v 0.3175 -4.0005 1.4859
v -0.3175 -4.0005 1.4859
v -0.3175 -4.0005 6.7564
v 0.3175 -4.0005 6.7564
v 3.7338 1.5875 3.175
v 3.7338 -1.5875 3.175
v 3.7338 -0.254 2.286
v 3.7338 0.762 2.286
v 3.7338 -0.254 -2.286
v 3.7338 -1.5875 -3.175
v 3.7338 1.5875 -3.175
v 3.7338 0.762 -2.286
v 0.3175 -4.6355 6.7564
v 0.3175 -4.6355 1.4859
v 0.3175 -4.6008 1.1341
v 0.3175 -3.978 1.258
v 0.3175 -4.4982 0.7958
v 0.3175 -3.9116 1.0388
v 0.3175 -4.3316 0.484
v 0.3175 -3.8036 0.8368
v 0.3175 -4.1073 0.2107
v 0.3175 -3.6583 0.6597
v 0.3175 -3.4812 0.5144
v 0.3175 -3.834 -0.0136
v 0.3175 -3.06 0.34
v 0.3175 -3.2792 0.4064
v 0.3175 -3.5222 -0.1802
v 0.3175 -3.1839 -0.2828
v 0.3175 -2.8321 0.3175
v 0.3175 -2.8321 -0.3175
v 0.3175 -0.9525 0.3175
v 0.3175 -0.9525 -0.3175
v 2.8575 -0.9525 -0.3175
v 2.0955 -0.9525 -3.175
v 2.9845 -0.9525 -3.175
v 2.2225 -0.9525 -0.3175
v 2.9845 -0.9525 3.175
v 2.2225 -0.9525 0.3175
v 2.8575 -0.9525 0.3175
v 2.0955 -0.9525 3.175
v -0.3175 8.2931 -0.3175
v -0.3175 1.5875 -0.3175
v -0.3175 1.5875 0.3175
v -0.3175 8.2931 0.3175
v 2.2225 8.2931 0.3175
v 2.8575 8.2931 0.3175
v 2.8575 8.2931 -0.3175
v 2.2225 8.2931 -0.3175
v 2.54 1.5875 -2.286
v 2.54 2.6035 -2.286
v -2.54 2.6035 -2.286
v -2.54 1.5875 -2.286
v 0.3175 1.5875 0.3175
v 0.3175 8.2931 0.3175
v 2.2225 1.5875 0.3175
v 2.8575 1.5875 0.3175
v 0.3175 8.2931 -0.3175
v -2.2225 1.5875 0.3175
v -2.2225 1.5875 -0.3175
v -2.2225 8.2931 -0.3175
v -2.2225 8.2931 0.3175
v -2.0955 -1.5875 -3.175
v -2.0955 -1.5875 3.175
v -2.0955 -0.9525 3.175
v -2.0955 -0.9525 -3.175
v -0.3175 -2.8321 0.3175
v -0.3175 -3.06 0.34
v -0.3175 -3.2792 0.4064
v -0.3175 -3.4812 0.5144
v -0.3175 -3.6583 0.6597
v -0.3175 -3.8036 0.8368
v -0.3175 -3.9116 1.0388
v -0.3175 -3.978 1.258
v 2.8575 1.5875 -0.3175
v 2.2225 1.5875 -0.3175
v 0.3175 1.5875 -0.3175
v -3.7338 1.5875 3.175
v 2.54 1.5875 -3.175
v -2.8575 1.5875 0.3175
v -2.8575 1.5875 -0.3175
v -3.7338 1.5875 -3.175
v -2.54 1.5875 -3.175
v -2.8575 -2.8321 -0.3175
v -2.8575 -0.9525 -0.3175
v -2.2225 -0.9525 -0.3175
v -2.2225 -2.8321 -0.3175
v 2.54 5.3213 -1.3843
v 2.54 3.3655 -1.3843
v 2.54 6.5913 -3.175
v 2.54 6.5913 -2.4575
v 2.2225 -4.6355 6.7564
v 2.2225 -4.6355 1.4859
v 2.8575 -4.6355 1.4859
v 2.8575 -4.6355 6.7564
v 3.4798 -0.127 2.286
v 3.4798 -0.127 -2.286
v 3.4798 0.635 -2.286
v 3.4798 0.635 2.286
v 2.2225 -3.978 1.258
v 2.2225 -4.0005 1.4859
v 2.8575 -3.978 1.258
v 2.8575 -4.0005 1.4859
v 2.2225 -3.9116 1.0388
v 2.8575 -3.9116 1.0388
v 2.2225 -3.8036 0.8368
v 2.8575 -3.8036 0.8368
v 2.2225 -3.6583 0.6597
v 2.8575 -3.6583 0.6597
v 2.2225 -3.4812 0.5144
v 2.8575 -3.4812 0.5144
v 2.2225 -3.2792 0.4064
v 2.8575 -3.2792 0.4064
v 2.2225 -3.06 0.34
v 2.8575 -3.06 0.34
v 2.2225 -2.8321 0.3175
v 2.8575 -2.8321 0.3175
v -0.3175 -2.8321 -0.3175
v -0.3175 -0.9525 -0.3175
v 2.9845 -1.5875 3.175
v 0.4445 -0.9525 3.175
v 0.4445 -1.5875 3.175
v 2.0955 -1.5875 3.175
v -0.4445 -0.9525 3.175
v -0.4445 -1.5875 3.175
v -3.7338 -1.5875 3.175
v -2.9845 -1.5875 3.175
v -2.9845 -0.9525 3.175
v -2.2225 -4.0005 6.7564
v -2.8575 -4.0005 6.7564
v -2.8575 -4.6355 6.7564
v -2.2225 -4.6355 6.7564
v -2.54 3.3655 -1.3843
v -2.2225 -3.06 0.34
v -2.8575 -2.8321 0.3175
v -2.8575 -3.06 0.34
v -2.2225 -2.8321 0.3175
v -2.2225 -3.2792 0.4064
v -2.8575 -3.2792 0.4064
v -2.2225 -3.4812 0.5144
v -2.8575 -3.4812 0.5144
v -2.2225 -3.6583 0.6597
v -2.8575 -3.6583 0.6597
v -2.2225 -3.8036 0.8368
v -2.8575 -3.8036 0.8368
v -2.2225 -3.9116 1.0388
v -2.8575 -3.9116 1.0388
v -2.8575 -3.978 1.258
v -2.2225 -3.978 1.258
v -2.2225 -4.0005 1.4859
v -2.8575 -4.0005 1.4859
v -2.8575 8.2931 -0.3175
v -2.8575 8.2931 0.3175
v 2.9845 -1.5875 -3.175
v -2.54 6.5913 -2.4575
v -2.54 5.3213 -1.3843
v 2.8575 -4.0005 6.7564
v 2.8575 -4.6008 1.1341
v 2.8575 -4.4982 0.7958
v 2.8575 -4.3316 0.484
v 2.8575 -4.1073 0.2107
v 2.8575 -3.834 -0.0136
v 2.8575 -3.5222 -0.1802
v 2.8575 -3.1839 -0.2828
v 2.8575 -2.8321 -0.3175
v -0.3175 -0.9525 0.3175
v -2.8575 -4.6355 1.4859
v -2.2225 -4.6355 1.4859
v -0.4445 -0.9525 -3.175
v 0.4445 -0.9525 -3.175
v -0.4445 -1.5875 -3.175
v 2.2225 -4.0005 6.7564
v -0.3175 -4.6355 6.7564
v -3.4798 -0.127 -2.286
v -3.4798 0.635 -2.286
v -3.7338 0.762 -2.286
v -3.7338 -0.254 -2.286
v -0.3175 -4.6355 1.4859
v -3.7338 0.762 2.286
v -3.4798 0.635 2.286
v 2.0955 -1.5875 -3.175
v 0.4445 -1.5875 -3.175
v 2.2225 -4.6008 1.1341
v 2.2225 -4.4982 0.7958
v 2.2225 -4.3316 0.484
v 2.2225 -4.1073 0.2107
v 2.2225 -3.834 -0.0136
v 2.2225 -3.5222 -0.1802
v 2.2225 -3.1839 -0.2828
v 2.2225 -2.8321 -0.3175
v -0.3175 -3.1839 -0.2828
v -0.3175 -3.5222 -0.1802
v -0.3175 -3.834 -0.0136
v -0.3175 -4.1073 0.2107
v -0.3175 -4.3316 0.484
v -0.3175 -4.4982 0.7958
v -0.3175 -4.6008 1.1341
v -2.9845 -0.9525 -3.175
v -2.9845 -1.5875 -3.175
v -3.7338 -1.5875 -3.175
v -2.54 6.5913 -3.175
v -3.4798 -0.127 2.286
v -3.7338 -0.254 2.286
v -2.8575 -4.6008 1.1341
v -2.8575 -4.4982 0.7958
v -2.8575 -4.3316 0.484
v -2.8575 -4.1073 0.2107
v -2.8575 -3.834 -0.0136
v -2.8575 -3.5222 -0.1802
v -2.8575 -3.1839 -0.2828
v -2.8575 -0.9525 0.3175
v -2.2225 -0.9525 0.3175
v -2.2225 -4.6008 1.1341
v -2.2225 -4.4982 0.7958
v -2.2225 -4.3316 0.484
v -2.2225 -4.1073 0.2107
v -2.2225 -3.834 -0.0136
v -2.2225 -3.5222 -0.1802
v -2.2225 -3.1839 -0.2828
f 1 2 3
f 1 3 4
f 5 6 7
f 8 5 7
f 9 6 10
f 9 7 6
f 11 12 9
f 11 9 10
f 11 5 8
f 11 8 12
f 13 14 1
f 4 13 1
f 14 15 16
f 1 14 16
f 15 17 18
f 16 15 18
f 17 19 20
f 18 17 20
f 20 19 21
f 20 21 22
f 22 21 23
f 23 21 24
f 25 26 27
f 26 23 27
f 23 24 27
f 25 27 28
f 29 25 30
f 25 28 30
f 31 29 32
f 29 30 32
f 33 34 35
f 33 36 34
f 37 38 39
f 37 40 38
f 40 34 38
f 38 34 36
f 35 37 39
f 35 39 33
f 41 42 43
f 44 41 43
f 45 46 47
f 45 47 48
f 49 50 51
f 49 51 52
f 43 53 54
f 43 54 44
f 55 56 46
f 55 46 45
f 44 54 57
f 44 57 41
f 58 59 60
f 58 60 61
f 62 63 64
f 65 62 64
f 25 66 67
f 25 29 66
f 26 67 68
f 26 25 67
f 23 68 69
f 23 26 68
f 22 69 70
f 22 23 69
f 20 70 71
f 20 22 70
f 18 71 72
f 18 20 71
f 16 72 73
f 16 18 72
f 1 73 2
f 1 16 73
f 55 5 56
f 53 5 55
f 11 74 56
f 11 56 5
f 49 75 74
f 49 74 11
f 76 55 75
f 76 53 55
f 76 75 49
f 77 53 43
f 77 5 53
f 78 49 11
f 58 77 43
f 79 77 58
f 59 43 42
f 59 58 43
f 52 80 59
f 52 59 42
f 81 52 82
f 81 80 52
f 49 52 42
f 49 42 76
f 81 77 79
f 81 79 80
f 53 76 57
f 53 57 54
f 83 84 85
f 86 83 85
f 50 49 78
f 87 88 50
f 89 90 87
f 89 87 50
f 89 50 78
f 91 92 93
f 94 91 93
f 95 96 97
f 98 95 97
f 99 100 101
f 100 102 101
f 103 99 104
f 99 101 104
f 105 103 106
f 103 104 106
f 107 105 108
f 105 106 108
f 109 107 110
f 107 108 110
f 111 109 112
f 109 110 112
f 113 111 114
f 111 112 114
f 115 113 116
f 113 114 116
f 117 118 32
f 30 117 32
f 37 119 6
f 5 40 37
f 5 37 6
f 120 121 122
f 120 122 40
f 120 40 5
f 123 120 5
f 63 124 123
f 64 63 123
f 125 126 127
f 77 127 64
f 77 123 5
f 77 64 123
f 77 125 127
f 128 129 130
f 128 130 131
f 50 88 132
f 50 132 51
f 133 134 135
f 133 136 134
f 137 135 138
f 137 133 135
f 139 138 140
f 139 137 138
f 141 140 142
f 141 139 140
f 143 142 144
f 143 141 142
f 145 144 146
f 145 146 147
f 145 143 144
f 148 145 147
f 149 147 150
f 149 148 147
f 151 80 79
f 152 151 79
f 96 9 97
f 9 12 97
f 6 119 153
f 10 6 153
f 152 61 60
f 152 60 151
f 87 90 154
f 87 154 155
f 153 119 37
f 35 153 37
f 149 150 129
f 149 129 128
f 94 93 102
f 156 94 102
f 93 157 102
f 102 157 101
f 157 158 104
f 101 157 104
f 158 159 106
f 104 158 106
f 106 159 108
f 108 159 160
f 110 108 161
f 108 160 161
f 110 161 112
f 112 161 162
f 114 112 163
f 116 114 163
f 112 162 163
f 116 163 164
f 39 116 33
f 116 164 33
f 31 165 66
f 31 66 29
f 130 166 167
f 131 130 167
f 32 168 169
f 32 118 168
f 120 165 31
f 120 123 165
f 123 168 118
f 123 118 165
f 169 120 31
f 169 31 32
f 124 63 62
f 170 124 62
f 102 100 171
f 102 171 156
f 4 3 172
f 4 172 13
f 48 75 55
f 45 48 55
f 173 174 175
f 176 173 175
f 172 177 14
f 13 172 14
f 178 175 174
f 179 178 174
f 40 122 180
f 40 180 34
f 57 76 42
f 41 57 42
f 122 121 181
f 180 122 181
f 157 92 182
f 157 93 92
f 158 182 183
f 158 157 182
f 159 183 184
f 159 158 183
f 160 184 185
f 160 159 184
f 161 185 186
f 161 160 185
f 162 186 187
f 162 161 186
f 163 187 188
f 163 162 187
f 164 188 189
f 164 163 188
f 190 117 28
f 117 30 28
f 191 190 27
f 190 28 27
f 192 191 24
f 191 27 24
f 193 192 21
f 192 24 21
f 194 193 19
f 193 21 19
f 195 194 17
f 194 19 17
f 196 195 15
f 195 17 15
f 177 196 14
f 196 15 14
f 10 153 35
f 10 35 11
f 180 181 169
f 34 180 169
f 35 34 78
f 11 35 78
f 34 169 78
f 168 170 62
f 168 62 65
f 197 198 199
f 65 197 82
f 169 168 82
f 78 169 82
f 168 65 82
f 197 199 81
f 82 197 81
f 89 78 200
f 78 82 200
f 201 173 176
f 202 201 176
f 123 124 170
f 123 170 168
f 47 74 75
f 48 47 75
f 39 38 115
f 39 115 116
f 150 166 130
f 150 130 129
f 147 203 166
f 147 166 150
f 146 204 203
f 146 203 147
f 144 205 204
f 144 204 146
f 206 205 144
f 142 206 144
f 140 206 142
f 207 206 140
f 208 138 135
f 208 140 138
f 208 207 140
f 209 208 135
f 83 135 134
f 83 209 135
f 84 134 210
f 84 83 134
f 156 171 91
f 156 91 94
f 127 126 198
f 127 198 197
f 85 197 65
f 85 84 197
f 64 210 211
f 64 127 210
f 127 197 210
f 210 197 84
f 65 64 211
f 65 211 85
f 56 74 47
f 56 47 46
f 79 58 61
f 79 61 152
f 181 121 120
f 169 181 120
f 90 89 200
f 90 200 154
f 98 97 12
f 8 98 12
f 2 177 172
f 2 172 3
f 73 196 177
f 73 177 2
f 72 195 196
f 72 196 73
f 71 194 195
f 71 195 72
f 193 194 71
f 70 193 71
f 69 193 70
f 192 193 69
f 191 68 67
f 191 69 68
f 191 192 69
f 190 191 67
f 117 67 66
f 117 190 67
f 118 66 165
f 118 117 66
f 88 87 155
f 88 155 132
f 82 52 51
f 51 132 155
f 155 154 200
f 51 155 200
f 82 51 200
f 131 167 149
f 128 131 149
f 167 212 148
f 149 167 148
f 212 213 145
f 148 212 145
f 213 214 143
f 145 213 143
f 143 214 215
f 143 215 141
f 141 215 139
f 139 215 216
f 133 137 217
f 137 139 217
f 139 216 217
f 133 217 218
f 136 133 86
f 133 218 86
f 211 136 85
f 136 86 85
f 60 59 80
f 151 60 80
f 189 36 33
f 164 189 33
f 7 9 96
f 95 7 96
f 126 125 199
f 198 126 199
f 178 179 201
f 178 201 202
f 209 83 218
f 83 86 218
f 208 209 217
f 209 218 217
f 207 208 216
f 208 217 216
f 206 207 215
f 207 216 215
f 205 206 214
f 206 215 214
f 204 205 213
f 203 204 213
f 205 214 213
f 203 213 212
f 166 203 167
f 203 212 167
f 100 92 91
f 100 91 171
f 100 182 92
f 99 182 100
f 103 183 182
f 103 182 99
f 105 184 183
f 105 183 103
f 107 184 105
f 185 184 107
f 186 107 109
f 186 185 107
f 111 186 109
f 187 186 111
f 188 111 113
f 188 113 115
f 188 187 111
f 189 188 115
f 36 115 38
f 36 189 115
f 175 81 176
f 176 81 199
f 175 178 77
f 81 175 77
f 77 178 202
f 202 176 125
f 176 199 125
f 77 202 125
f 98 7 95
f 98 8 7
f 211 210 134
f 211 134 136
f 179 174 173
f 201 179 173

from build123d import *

# Parameters (mm, degrees)
SKETCH1_W            = 6.2738
SKETCH1_H            = 6.35
BOSS_EXTRUDE1_DEPTH  = 3.175
BOSS_EXTRUDE2_DEPTH  = 5.08
SKETCH3_W            = 6.35
SKETCH3_H            = 3.175
BOSS_EXTRUDE3_DEPTH  = 1.1938
SKETCH4_W            = 0.889
SKETCH4_H            = 0.635
CUT_EXTRUDE1_DEPTH   = 10.884786195
SKETCH5_W            = 0.635
SKETCH5_H            = 0.635
BOSS_EXTRUDE4_DEPTH  = 3.683
SKETCH6_W            = 0.635
SKETCH6_H            = 0.635
BOSS_EXTRUDE5_DEPTH  = 6.4389
SKETCH7_W            = 0.889
SKETCH7_H            = 0.635
CUT_EXTRUDE2_DEPTH   = 10.884786195
SKETCH8_W            = 0.635
SKETCH8_H            = 0.635
BOSS_EXTRUDE6_DEPTH  = 3.683
SKETCH9_W            = 0.635
SKETCH9_H            = 0.635
BOSS_EXTRUDE7_DEPTH  = 6.4389
SKETCH10_W           = 0.889
SKETCH10_H           = 0.635
CUT_EXTRUDE3_DEPTH   = 10.884786195
SKETCH11_W           = 0.635
SKETCH11_H           = 0.635
BOSS_EXTRUDE8_DEPTH  = 3.683
SKETCH12_W           = 0.635
SKETCH12_H           = 0.635
BOSS_EXTRUDE9_DEPTH  = 6.4389
SKETCH13_W           = 0.635
SKETCH13_H           = 0.635
BOSS_EXTRUDE10_DEPTH = 6.7056
SKETCH14_W           = 0.635
SKETCH14_H           = 0.635
BOSS_EXTRUDE11_DEPTH = 6.7056
SKETCH15_W           = 0.635
SKETCH15_H           = 0.635
BOSS_EXTRUDE12_DEPTH = 6.7056
CUT_EXTRUDE4_DEPTH   = 4.572
CUT_EXTRUDE5_DEPTH   = 4.572
FILLET1_R            = 1.1684
FILLET2_R            = 1.8034


with BuildPart() as part:
    # Sketch1 → Boss-Extrude1 (new body)
    with BuildSketch(Plane.XZ.offset(1.5875)):
        with Locations((-0.5969, 0)):
            Rectangle(SKETCH1_W, SKETCH1_H)
    extrude(amount=-BOSS_EXTRUDE1_DEPTH)

    # Sketch2 → Boss-Extrude2 (add)
    with BuildSketch(Plane(origin=(2.54, 0, 0), x_dir=(0, 0, -1), z_dir=(1, 0, 0))):
        Polygon((1.3843, 3.3655), (2.286, 2.6035), (2.286, 1.5875), (3.175, 1.5875), (3.175, 6.5913), (2.457539437, 6.5913), (1.3843, 5.3213), align=None)
    extrude(amount=-BOSS_EXTRUDE2_DEPTH)

    # Sketch3 → Boss-Extrude3 (add)
    with BuildSketch(Plane(origin=(2.54, 0, 0), x_dir=(0, 0, -1), z_dir=(1, 0, 0))):
        Rectangle(SKETCH3_W, SKETCH3_H)
    extrude(amount=BOSS_EXTRUDE3_DEPTH)

    # Sketch4 → Cut-Extrude1 (cut, through all)
    with BuildSketch(Plane.XY.offset(3.175)):
        with Locations((0, -1.27)):
            Rectangle(SKETCH4_W, SKETCH4_H)
    extrude(amount=-CUT_EXTRUDE1_DEPTH, mode=Mode.SUBTRACT)

    # Sketch5 → Boss-Extrude4 (add)
    with BuildSketch(Plane.XZ.offset(0.9525)):
        Rectangle(SKETCH5_W, SKETCH5_H)
    extrude(amount=BOSS_EXTRUDE4_DEPTH)

    # Sketch6 → Boss-Extrude5 (add)
    with BuildSketch(Plane.XY.offset(0.3175)):
        with Locations((0, -4.318)):
            Rectangle(SKETCH6_W, SKETCH6_H)
    extrude(amount=BOSS_EXTRUDE5_DEPTH)

    # Sketch7 → Cut-Extrude2 (cut, through all)
    with BuildSketch(Plane.XY.offset(3.175)):
        with Locations((-2.54, -1.27)):
            Rectangle(SKETCH7_W, SKETCH7_H)
    extrude(amount=-CUT_EXTRUDE2_DEPTH, mode=Mode.SUBTRACT)

    # Sketch8 → Boss-Extrude6 (add)
    with BuildSketch(Plane.XZ.offset(0.9525)):
        with Locations((-2.54, 0)):
            Rectangle(SKETCH8_W, SKETCH8_H)
    extrude(amount=BOSS_EXTRUDE6_DEPTH)

    # Sketch9 → Boss-Extrude7 (add)
    with BuildSketch(Plane.XY.offset(0.3175)):
        with Locations((-2.54, -4.318)):
            Rectangle(SKETCH9_W, SKETCH9_H)
    extrude(amount=BOSS_EXTRUDE7_DEPTH)

    # Sketch10 → Cut-Extrude3 (cut, through all)
    with BuildSketch(Plane.XY.offset(3.175)):
        with Locations((2.54, -1.27)):
            Rectangle(SKETCH10_W, SKETCH10_H)
    extrude(amount=-CUT_EXTRUDE3_DEPTH, mode=Mode.SUBTRACT)

    # Sketch11 → Boss-Extrude8 (add)
    with BuildSketch(Plane.XZ.offset(0.9525)):
        with Locations((2.54, 0)):
            Rectangle(SKETCH11_W, SKETCH11_H)
    extrude(amount=BOSS_EXTRUDE8_DEPTH)

    # Sketch12 → Boss-Extrude9 (add)
    with BuildSketch(Plane.XY.offset(0.3175)):
        with Locations((2.54, -4.318)):
            Rectangle(SKETCH12_W, SKETCH12_H)
    extrude(amount=BOSS_EXTRUDE9_DEPTH)

    # Sketch13 → Boss-Extrude10 (add)
    with BuildSketch(Plane(origin=(0, 1.5875, 0), x_dir=(-1, 0, 0), z_dir=(0, 1, 0))):
        with Locations((2.54, 0)):
            Rectangle(SKETCH13_W, SKETCH13_H)
    extrude(amount=BOSS_EXTRUDE10_DEPTH)

    # Sketch14 → Boss-Extrude11 (add)
    with BuildSketch(Plane(origin=(0, 1.5875, 0), x_dir=(-1, 0, 0), z_dir=(0, 1, 0))):
        Rectangle(SKETCH14_W, SKETCH14_H)
    extrude(amount=BOSS_EXTRUDE11_DEPTH)

    # Sketch15 → Boss-Extrude12 (add)
    with BuildSketch(Plane(origin=(0, 1.5875, 0), x_dir=(-1, 0, 0), z_dir=(0, 1, 0))):
        with Locations((-2.54, 0)):
            Rectangle(SKETCH15_W, SKETCH15_H)
    extrude(amount=BOSS_EXTRUDE12_DEPTH)

    # Sketch16 → Cut-Extrude4 (cut)
    with BuildSketch(Plane(origin=(0, 0, -2.286), x_dir=(-1, 0, 0), z_dir=(0, 0, -1))):
        Polygon((3.7338, 0.762), (3.4798, 0.635), (3.4798, -0.127), (3.7338, -0.254), align=None)
    extrude(amount=-CUT_EXTRUDE4_DEPTH, mode=Mode.SUBTRACT)

    # Sketch17 → Cut-Extrude5 (cut)
    with BuildSketch(Plane(origin=(0, 0, -2.286), x_dir=(-1, 0, 0), z_dir=(0, 0, -1))):
        Polygon((-3.7338, -0.254), (-3.4798, -0.127), (-3.4798, 0.635), (-3.7338, 0.762), align=None)
    extrude(amount=-CUT_EXTRUDE5_DEPTH, mode=Mode.SUBTRACT)

    # Fillet1
    fillet1_edges = [part.edges().sort_by_distance(p)[0] for p in [
        (-2.54, -4.0005, 0.3175),
        (2.54, -4.0005, 0.3175),
        (0, -4.0005, 0.3175),
    ]]
    fillet(fillet1_edges, radius=FILLET1_R)

    # Fillet2
    fillet2_edges = [part.edges().sort_by_distance(p)[0] for p in [
        (-2.54, -4.6355, -0.3175),
        (2.54, -4.6355, -0.3175),
        (0, -4.6355, -0.3175),
    ]]
    fillet(fillet2_edges, radius=FILLET2_R)


solid = part.part
